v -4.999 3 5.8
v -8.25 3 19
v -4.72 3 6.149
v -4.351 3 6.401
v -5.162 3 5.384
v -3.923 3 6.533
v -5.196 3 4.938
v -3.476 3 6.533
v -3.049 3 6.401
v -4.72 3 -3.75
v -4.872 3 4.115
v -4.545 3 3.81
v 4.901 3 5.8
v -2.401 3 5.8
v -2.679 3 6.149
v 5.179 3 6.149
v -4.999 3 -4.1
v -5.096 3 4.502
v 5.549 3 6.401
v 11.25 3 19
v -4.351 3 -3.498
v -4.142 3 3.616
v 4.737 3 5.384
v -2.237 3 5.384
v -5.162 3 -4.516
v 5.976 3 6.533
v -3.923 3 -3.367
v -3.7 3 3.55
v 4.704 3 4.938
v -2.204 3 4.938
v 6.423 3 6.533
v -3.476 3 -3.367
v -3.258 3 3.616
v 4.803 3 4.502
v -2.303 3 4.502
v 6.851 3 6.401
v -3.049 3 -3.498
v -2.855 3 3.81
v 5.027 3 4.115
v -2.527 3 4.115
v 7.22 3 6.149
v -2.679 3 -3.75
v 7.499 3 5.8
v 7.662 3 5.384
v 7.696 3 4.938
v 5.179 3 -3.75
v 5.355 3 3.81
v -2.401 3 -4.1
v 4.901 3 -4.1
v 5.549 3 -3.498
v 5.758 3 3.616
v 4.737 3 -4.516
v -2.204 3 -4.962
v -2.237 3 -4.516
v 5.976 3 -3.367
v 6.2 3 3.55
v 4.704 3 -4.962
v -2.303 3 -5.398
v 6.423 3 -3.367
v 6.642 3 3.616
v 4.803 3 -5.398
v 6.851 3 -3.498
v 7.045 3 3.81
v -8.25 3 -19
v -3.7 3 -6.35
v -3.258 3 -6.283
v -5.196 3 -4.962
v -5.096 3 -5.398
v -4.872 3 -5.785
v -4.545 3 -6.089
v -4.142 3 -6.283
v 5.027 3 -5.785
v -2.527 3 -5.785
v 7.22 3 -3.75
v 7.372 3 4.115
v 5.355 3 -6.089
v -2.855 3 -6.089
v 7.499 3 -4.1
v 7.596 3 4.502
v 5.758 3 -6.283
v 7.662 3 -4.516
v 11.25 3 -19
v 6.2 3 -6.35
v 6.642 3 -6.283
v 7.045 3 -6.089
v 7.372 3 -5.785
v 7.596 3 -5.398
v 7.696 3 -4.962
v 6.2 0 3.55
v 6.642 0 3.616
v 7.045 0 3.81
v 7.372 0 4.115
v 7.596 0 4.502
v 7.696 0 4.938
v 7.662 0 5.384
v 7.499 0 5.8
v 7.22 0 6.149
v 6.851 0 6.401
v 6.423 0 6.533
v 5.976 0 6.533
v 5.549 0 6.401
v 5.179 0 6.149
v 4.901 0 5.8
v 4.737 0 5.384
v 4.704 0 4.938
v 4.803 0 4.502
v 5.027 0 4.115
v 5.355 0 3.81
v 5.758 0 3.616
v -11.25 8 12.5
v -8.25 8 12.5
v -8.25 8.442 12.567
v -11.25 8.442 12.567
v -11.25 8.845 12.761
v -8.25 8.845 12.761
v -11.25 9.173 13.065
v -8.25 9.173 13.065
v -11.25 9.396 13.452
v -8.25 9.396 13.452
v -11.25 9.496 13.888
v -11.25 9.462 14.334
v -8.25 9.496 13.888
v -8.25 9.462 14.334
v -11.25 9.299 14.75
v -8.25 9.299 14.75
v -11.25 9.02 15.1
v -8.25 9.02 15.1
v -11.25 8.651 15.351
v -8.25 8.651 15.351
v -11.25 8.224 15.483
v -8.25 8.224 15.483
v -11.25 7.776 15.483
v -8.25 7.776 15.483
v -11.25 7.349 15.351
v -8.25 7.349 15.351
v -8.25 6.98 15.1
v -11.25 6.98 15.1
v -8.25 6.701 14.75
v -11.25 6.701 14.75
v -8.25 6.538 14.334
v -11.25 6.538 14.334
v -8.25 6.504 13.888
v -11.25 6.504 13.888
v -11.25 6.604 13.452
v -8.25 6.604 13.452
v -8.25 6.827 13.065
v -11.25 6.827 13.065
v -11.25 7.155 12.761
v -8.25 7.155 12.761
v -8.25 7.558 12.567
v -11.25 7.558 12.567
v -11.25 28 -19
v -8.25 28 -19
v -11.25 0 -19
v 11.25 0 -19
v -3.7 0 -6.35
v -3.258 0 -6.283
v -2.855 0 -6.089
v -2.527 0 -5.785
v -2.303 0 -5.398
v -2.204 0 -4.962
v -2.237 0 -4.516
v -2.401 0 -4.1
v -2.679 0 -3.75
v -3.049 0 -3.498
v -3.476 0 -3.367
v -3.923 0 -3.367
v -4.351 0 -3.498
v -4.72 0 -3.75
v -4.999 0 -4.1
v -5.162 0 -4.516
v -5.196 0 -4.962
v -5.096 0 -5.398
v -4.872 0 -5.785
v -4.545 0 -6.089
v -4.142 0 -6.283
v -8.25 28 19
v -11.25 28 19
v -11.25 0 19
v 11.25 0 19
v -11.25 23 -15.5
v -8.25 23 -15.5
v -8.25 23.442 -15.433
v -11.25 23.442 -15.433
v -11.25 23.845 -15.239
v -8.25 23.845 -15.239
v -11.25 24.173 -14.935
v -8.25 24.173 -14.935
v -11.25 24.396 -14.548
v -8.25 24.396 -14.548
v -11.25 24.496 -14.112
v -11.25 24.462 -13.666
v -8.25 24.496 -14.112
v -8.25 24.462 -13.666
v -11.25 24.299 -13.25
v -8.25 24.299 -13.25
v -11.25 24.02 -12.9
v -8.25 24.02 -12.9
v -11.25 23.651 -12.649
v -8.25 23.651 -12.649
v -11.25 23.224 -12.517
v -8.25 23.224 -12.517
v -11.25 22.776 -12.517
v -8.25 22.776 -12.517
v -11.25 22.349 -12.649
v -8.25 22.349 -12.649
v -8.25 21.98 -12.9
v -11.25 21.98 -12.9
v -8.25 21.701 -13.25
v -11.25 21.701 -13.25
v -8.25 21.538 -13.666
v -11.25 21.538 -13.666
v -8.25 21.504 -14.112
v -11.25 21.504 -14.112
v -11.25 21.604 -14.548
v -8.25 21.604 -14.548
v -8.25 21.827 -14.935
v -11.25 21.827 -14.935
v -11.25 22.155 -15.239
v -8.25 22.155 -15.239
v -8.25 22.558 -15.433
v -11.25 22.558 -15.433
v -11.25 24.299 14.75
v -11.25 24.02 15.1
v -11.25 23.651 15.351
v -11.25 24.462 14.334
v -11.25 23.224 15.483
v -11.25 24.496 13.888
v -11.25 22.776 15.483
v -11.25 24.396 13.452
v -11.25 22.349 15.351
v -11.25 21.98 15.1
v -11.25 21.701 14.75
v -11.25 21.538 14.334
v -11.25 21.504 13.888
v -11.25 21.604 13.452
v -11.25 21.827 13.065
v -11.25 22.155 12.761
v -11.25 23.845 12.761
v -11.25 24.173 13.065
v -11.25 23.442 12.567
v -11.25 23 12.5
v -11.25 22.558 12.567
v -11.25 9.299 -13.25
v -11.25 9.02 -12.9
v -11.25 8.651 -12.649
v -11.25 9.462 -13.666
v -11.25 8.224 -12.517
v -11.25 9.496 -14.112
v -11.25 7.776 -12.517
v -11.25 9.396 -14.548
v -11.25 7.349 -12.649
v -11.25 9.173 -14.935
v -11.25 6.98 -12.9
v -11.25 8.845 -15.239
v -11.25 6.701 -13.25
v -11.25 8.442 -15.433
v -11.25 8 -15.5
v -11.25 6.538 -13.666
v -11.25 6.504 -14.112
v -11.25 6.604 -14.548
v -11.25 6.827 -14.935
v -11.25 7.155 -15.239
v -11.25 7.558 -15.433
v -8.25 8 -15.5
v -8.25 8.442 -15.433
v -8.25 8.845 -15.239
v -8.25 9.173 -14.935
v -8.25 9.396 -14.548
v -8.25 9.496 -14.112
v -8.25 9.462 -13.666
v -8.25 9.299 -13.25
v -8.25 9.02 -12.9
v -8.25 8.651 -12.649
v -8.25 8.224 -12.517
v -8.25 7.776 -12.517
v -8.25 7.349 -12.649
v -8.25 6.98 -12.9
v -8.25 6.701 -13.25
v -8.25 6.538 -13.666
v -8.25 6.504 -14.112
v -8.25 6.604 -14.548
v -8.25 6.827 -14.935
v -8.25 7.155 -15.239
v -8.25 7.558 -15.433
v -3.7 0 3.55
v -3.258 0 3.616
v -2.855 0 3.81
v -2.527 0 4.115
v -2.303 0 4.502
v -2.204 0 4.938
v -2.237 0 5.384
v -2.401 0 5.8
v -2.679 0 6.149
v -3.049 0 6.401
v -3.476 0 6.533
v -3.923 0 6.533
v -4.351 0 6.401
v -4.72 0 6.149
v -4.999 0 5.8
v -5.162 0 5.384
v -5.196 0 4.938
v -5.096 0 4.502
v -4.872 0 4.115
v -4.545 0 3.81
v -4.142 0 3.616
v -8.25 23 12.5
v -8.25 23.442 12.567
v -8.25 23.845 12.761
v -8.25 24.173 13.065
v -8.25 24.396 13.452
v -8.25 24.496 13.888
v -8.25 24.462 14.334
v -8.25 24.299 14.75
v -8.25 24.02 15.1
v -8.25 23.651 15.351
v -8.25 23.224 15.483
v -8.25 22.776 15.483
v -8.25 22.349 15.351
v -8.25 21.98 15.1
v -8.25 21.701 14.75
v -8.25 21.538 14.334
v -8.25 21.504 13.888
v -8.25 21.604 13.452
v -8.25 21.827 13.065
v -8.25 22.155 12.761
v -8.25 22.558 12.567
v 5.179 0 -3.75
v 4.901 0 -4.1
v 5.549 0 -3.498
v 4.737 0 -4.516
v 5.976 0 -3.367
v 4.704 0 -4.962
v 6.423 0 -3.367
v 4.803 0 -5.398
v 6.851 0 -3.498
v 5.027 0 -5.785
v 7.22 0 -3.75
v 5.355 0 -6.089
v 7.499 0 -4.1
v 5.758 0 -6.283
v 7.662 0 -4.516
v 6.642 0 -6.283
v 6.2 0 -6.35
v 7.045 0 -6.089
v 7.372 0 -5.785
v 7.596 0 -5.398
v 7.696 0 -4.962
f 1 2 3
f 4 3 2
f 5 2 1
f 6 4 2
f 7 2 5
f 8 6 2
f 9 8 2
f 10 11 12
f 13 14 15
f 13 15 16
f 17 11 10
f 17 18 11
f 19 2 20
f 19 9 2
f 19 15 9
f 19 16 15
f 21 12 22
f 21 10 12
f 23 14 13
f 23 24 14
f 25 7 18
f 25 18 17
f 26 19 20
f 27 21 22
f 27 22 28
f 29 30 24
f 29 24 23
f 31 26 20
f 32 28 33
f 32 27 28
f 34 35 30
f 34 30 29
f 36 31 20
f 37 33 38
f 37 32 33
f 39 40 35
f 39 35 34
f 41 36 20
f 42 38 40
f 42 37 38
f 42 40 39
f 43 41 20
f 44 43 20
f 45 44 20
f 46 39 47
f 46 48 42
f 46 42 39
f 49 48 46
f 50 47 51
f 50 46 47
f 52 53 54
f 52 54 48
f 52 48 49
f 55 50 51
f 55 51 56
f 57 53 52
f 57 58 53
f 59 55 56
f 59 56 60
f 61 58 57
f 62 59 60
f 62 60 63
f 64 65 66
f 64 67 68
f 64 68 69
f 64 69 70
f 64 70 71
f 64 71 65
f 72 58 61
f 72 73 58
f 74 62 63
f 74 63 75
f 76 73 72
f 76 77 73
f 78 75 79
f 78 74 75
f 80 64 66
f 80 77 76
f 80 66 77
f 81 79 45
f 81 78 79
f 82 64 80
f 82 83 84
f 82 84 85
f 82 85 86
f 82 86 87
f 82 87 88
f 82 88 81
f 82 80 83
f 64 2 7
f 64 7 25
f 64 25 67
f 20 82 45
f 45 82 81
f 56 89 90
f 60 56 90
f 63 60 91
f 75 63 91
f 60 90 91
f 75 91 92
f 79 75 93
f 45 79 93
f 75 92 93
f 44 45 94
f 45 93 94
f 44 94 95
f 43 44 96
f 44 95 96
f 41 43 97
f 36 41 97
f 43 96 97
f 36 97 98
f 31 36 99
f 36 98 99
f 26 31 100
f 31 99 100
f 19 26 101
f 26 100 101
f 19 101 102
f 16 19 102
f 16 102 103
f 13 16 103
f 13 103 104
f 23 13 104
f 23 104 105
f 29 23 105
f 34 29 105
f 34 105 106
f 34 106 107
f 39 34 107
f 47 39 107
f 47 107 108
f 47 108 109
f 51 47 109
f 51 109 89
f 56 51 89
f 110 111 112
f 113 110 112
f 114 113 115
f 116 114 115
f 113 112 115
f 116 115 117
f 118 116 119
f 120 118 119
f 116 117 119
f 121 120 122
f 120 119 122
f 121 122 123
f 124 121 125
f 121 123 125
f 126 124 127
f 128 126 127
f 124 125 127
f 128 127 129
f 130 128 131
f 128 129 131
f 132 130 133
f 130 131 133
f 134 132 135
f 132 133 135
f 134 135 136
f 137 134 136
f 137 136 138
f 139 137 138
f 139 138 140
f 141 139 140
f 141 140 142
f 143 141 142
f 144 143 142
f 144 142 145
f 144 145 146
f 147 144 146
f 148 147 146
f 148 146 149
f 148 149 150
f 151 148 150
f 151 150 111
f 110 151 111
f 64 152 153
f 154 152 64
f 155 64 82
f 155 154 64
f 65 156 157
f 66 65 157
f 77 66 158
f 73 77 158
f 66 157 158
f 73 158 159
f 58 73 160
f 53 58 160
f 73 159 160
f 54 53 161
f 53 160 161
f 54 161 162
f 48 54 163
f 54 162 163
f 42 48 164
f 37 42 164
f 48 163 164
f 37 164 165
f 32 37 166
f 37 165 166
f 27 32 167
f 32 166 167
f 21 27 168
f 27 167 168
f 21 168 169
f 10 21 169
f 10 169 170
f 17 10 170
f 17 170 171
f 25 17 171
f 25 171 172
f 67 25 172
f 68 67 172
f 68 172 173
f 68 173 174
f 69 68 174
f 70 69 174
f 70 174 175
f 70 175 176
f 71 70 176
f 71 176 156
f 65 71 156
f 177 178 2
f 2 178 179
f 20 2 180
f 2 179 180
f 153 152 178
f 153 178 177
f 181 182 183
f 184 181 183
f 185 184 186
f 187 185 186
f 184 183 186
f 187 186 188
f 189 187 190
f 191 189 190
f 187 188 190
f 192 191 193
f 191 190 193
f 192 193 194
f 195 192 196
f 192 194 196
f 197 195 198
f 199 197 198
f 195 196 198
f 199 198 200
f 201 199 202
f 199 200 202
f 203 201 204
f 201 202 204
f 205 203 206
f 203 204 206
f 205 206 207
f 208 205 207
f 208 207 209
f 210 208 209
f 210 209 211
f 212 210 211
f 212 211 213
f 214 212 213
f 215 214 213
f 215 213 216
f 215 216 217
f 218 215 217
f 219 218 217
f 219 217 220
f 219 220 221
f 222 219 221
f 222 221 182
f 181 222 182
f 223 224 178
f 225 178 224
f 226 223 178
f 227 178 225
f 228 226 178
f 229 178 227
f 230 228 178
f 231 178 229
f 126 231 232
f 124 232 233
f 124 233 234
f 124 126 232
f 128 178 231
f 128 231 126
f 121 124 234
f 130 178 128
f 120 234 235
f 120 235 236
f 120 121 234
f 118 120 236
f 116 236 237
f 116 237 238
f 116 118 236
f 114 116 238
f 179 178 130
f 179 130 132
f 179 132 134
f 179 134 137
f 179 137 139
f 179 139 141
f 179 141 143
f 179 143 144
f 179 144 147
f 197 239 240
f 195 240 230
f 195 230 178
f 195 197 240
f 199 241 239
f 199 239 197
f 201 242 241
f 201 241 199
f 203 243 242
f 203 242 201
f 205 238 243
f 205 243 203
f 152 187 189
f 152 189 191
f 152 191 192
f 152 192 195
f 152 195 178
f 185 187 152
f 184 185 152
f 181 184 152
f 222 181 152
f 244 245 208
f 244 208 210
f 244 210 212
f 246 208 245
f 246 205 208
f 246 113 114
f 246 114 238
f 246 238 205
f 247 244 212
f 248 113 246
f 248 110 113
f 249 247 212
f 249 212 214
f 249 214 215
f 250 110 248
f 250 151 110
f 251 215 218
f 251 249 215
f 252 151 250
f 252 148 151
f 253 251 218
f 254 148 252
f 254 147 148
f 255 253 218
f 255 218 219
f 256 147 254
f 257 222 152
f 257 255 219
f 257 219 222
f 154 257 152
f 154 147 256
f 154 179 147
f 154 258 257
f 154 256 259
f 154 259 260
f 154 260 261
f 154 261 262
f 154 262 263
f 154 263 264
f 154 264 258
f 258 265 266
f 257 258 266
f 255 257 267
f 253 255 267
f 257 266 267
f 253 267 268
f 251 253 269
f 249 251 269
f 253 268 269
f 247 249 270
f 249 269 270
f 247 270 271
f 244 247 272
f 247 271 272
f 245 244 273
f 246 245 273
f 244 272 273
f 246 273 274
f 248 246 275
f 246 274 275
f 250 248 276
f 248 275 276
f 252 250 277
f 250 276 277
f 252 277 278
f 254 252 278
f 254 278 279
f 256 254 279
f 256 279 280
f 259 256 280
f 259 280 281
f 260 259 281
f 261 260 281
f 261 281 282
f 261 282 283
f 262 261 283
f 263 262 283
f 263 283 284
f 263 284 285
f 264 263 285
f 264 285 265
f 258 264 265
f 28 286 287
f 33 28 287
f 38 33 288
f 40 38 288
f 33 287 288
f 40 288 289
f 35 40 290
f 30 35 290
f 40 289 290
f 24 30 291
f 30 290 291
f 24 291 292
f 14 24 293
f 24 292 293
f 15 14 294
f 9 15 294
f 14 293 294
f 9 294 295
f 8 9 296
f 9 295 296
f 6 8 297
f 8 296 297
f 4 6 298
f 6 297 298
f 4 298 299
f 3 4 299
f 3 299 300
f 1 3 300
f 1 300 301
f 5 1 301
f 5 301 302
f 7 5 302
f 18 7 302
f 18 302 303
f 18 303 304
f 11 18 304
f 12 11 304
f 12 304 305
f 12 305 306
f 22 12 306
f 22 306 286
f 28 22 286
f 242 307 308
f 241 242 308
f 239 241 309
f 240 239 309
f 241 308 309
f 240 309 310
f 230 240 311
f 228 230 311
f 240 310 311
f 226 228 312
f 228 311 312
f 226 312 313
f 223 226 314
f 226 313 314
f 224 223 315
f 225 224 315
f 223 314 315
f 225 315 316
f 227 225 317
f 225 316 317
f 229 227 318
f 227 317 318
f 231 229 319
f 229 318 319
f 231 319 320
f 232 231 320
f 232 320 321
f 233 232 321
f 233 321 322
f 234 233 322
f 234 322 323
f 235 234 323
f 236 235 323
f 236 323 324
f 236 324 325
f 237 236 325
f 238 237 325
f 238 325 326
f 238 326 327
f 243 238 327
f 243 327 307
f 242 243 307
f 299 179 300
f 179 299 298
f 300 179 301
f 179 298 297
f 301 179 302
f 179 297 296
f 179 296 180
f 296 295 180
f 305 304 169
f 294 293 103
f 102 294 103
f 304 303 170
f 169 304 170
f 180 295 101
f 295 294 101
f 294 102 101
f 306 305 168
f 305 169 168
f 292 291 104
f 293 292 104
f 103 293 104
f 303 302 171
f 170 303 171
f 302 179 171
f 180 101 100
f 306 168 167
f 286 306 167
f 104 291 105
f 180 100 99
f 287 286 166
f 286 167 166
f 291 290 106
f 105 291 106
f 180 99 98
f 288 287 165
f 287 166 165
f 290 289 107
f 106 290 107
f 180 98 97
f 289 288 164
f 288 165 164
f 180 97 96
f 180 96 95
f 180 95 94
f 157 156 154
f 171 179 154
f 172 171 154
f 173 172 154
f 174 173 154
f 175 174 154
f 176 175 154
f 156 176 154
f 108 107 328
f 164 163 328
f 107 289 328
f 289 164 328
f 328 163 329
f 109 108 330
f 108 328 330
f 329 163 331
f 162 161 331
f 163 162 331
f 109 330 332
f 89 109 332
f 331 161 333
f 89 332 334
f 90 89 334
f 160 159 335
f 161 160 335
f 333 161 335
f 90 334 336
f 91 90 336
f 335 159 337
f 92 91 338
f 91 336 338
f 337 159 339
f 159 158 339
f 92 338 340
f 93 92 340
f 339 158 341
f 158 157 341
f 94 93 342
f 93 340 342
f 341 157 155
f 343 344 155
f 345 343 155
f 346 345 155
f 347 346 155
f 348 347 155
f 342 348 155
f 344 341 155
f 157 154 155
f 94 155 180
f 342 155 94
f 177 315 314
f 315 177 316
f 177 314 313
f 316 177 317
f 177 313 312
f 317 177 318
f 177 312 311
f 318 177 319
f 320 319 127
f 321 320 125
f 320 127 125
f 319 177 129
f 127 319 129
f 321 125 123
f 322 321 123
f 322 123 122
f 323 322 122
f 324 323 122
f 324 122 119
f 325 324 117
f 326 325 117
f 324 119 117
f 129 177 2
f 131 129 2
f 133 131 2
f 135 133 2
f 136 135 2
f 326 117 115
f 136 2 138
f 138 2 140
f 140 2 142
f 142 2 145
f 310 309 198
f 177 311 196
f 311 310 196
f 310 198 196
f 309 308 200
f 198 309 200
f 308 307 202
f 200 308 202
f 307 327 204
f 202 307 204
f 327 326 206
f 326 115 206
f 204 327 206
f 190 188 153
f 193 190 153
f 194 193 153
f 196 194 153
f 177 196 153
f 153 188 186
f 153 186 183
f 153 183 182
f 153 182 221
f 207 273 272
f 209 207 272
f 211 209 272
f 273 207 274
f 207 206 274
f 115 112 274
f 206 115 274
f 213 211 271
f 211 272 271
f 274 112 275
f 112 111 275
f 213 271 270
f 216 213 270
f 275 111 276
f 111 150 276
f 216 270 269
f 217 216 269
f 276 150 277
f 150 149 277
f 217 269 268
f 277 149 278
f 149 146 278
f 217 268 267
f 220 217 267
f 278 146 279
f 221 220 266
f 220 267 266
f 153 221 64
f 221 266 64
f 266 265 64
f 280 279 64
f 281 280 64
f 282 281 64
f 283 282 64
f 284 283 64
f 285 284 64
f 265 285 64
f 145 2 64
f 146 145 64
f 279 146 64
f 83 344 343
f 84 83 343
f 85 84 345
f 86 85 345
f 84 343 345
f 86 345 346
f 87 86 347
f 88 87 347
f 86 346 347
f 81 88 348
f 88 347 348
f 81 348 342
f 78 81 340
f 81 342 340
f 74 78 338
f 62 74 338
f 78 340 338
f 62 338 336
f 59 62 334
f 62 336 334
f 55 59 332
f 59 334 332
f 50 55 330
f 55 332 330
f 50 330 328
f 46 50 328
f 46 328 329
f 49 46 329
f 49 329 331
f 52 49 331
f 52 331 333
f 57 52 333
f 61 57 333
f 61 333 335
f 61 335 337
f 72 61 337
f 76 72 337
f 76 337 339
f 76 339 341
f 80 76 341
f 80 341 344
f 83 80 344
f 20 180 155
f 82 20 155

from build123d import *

# Parameters (mm, degrees)
SKETCH_1_W          = 22.5
SKETCH_1_H          = 38
EXTRUDE_1_DEPTH     = 3
SKETCH_2_W          = 3
SKETCH_2_H          = 38
EXTRUDE_2_DEPTH     = 25
SKETCH_3_R          = 1.5
CUT_EXTRUDE_2_DEPTH = 25
SKETCH_4_R          = 1.5
CUT_EXTRUDE_3_DEPTH = 25


with BuildPart() as part:
    # 草图1 → 凸台-拉伸1 (new body)
    with BuildSketch(Plane(origin=(0, 0, 0), x_dir=(1, 0, 0), z_dir=(0, 1, 0))):
        Rectangle(SKETCH_1_W, SKETCH_1_H)
    extrude(amount=EXTRUDE_1_DEPTH)

    # 草图2 → 凸台-拉伸2 (add)
    with BuildSketch(Plane(origin=(0, 3, 0), x_dir=(1, 0, 0), z_dir=(0, 1, 0))):
        with Locations((-9.75, 0)):
            Rectangle(SKETCH_2_W, SKETCH_2_H)
    extrude(amount=EXTRUDE_2_DEPTH)

    # 草图3 → 切除-拉伸2 (cut)
    with BuildSketch(Plane.XZ):
        with Locations(Location((-3.699747468, 5.049747468, 0), (0, 0, 270))):
            Circle(SKETCH_3_R)
        with Locations(Location((6.199747468, 5.049747468, 0), (0, 0, 270))):
            Circle(SKETCH_3_R)
        with Locations(Location((-3.699747468, -4.849747468, 0), (0, 0, 270))):
            Circle(SKETCH_3_R)
        with Locations(Location((6.199747468, -4.849747468, 0), (0, 0, 270))):
            Circle(SKETCH_3_R)
    extrude(amount=-CUT_EXTRUDE_2_DEPTH, mode=Mode.SUBTRACT)

    # 草图4 → 切除-拉伸3 (cut)
    with BuildSketch(Plane(origin=(-8.25, 0, 0), x_dir=(0, 0, -1), z_dir=(1, 0, 0))):
        with Locations((14, 23)):
            Circle(SKETCH_4_R)
        with Locations((-14, 23)):
            Circle(SKETCH_4_R)
        with Locations((-14, 8)):
            Circle(SKETCH_4_R)
        with Locations((14, 8)):
            Circle(SKETCH_4_R)
    extrude(amount=-CUT_EXTRUDE_3_DEPTH, mode=Mode.SUBTRACT)


solid = part.part
